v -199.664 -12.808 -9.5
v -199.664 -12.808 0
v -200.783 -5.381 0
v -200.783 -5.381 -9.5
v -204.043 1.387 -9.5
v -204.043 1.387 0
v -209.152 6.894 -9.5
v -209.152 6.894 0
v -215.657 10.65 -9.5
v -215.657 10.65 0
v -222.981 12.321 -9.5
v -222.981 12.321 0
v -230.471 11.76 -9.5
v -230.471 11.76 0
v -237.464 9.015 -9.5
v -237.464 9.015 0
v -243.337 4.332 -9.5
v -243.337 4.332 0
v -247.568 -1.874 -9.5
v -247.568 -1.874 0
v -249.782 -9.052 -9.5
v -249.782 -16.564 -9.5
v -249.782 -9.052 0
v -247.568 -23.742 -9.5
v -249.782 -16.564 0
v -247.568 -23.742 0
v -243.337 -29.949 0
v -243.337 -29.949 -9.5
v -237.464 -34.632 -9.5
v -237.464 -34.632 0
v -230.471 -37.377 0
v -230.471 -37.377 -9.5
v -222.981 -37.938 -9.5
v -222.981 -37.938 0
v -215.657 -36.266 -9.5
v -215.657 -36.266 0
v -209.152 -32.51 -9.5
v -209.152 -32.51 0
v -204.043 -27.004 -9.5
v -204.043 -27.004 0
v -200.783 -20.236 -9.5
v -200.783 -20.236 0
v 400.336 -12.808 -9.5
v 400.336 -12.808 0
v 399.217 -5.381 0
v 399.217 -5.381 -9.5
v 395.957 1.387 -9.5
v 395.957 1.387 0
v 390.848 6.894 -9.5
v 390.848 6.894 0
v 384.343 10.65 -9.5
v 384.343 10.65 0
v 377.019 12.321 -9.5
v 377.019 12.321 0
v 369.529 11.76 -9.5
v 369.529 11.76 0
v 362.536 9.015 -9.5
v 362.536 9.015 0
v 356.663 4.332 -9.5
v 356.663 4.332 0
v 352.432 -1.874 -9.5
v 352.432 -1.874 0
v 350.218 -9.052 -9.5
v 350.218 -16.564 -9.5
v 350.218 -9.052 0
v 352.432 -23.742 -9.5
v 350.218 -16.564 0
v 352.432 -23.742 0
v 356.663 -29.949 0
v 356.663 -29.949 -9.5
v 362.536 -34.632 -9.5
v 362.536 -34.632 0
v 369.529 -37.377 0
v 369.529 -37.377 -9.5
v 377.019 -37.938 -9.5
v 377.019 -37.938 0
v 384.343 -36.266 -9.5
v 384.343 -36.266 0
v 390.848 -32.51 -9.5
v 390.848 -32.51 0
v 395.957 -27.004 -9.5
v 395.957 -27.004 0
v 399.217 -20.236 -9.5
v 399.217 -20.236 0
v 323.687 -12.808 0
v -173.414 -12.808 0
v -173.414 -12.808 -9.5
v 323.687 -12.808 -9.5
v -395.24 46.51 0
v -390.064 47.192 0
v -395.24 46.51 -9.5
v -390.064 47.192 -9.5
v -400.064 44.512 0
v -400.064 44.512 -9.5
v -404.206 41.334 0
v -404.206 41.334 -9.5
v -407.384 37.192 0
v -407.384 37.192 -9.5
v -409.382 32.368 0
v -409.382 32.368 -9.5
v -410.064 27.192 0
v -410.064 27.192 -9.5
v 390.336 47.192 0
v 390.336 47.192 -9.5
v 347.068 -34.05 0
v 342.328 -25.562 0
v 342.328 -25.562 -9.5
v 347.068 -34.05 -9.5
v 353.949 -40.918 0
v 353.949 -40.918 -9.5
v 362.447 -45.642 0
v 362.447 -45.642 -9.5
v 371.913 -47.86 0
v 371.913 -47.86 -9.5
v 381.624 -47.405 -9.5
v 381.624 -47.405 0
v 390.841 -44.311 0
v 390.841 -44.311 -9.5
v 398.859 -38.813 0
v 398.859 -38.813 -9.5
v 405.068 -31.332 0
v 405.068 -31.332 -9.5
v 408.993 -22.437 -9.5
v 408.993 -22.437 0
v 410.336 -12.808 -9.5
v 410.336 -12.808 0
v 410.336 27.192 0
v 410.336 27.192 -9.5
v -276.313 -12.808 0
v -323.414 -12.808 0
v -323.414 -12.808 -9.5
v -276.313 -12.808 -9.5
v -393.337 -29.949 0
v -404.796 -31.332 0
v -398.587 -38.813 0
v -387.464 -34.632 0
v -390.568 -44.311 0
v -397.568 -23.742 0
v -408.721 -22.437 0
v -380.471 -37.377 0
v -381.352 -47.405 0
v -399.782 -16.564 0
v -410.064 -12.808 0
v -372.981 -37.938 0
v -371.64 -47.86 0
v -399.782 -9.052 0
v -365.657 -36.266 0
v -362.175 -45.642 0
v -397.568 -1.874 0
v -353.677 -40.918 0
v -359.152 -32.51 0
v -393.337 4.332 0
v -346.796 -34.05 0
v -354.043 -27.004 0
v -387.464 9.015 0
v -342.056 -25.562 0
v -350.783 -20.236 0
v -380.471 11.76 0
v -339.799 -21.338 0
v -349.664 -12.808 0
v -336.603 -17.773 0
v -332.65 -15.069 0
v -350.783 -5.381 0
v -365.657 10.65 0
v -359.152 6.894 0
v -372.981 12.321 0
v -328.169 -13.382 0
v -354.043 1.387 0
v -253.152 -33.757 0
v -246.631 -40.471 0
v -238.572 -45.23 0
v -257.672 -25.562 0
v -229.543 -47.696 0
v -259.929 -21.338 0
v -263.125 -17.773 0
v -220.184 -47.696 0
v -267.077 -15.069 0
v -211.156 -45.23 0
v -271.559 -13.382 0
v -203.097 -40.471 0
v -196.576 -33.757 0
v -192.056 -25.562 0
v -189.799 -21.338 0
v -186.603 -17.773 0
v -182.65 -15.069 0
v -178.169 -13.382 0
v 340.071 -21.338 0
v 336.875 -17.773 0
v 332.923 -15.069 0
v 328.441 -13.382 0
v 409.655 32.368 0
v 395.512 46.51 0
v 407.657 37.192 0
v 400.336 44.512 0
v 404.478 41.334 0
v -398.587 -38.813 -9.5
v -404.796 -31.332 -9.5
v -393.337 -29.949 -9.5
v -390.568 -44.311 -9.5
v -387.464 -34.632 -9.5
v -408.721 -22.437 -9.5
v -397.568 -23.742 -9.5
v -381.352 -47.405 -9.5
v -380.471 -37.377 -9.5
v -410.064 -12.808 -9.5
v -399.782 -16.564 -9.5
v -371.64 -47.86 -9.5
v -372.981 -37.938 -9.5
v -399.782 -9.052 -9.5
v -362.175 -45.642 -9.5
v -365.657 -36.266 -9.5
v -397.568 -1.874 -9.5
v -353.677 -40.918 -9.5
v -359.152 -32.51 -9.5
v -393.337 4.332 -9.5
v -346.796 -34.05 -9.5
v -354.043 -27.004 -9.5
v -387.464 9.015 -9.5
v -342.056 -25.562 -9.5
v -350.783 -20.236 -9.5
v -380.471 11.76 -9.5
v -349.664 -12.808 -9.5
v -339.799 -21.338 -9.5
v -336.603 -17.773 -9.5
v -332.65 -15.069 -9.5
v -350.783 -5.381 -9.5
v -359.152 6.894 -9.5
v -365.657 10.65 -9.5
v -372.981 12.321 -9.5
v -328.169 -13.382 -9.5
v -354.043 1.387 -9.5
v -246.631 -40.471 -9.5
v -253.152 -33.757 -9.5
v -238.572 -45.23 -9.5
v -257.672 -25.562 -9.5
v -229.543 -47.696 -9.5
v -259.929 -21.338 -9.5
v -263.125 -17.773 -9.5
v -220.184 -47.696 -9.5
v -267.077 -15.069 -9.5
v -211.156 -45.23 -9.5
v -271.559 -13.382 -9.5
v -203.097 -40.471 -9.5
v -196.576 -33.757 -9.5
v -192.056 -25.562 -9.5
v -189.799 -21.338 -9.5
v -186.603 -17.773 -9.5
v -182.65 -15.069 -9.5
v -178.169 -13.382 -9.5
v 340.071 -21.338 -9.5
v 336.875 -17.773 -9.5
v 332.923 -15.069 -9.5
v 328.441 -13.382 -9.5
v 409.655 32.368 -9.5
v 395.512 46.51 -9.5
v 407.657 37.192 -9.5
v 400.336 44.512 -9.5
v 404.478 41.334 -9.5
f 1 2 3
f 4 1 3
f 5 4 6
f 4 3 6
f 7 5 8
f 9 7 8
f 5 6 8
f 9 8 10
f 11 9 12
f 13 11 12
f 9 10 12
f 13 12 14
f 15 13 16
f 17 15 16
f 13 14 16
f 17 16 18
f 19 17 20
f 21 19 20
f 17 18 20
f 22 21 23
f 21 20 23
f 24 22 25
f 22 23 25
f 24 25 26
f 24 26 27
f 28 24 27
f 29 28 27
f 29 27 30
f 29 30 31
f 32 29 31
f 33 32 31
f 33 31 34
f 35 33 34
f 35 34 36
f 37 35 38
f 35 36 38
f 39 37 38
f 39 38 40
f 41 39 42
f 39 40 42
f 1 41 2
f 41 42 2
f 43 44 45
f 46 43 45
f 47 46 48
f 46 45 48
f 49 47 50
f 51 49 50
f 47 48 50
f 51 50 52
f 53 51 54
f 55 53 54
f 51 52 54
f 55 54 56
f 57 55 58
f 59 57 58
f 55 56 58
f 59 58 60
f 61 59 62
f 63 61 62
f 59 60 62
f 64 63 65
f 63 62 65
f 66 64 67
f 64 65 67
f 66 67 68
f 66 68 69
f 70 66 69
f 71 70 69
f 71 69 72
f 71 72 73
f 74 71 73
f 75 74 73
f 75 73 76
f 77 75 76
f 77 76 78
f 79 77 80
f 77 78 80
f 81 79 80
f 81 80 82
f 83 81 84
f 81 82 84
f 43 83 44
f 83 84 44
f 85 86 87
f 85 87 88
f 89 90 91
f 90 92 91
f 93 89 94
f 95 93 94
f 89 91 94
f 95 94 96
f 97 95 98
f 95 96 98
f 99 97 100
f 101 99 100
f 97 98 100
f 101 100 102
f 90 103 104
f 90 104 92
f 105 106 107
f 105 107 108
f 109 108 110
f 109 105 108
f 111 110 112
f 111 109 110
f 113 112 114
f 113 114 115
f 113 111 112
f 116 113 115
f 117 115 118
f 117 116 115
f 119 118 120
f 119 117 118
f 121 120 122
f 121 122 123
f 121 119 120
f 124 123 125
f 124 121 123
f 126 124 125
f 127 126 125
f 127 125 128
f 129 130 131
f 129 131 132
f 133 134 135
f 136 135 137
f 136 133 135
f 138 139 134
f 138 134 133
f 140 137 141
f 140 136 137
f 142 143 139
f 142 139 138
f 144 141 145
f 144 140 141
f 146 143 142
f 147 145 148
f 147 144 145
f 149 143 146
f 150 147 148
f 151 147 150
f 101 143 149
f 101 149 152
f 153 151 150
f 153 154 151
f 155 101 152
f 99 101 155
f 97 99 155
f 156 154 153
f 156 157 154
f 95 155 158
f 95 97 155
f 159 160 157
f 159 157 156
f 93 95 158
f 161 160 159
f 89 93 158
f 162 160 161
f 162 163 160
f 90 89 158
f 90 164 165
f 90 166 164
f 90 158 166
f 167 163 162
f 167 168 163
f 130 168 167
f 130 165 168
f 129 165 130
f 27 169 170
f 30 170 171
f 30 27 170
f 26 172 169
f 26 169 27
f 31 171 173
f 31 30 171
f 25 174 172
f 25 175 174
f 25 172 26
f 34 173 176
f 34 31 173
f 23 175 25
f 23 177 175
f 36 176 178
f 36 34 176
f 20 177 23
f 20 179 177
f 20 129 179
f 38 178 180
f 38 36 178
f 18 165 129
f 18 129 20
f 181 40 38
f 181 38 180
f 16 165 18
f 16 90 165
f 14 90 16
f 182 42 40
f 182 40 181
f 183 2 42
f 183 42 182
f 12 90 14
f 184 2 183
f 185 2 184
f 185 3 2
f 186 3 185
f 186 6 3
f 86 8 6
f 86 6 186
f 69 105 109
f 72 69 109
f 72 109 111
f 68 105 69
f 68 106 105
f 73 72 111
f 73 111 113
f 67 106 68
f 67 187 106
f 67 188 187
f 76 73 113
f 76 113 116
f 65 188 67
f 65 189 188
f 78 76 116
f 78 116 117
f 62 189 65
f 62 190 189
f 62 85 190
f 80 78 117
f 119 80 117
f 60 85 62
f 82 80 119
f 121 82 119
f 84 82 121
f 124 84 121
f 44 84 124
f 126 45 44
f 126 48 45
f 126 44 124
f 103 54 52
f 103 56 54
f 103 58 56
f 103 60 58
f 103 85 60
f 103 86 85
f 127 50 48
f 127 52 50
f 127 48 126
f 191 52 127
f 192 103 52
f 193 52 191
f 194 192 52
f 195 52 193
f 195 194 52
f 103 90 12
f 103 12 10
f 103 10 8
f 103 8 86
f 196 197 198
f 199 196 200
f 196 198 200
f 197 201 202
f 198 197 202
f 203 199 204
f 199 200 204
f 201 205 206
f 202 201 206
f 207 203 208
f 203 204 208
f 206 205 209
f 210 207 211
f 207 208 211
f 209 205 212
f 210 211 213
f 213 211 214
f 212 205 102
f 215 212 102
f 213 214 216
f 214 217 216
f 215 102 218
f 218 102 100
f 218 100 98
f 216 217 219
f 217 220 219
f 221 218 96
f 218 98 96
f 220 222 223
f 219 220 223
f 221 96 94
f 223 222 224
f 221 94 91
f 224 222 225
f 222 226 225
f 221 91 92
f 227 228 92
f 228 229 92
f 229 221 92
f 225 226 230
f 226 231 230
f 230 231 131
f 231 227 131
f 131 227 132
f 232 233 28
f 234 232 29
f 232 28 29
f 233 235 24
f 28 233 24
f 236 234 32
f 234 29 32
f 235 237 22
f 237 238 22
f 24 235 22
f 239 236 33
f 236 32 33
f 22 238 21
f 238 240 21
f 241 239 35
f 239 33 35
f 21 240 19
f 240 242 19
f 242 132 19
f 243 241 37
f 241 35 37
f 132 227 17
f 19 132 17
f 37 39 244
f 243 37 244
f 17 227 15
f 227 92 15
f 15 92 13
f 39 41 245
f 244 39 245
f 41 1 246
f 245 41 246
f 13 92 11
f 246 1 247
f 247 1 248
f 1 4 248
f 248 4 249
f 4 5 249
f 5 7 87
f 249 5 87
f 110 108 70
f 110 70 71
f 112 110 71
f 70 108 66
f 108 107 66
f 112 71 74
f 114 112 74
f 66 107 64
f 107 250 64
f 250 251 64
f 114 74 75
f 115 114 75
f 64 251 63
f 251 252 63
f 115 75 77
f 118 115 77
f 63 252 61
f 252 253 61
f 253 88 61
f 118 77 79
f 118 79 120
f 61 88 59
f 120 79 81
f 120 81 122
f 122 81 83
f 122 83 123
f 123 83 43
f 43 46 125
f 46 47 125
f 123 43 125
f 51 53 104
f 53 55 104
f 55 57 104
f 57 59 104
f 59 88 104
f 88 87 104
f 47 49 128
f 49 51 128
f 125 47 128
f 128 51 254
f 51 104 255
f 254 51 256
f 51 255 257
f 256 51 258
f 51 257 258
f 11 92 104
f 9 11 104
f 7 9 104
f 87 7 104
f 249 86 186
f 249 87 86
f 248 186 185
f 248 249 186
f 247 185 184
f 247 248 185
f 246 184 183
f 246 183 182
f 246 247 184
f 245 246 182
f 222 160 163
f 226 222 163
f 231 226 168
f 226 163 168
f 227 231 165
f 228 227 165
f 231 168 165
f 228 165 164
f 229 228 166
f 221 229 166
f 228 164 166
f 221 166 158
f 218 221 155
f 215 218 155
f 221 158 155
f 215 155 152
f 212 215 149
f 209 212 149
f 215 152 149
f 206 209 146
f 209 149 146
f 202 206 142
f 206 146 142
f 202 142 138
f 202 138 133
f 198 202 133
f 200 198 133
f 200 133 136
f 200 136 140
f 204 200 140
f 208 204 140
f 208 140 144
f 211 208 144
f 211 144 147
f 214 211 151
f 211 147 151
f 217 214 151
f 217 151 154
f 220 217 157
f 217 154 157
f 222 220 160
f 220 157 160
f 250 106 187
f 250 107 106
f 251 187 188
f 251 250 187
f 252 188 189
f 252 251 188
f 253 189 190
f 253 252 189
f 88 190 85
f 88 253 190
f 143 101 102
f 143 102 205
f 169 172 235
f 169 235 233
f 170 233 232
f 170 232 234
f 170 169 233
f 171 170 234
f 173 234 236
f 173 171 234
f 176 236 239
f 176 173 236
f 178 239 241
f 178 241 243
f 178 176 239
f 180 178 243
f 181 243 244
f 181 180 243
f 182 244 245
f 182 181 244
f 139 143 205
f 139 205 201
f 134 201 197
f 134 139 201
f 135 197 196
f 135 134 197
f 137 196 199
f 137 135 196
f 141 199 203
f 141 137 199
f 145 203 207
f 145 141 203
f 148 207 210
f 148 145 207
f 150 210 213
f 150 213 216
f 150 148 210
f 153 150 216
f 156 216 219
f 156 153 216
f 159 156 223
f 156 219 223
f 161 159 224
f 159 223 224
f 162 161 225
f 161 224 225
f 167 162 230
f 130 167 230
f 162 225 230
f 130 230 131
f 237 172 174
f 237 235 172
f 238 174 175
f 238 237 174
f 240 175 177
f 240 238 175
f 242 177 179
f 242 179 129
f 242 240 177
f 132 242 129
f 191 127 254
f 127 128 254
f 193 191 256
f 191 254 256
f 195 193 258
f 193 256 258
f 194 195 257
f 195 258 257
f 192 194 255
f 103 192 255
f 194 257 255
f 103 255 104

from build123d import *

# Parameters (mm, degrees)
ESBO_O2_R          = 25.2
FLANGE_BASE1_DEPTH = 9.5
FILETE1_R          = 20


# Sheet-metal steps are written as plain solids
with BuildPart() as part:
    # Esboço2 → Flange-base1 (new body)
    with BuildSketch(Plane.XY):
        with BuildLine():
            Line((410.336115278, -12.808345835), (410.336115278, 47.191654165))
            Line((410.336115278, 47.191654165), (-410.063884722, 47.191654165))
            Line((-410.063884722, 47.191654165), (-410.063884722, -12.808345835))
            ThreePointArc((-410.063884722, -12.808345835), (-374.863884722, -48.008345835), (-339.663884722, -12.808345835))
            Line((-339.663884722, -12.808345835), (-260.063884722, -12.808345835))
            ThreePointArc((-260.063884722, -12.808345835), (-224.863884722, -48.008345835), (-189.663884722, -12.808345835))
            Line((-189.663884722, -12.808345835), (339.936115278, -12.808345835))
            ThreePointArc((339.936115278, -12.808345835), (375.136115278, -48.008345835), (410.336115278, -12.808345835))
        make_face()
        with Locations((375.136115278, -12.808345835)):
            Circle(ESBO_O2_R, mode=Mode.SUBTRACT)
        with Locations((-224.863884722, -12.808345835)):
            Circle(ESBO_O2_R, mode=Mode.SUBTRACT)
        with Locations((-374.863884722, -12.808345835)):
            Circle(ESBO_O2_R, mode=Mode.SUBTRACT)
    extrude(amount=-FLANGE_BASE1_DEPTH)

    # Filete1
    filete1_edges = [part.edges().sort_by_distance(p)[0] for p in [
        (339.936115278, -12.808345835, -4.75),
        (-189.663884722, -12.808345835, -4.75),
        (-260.063884722, -12.808345835, -4.75),
        (-339.663884722, -12.808345835, -4.75),
        (-410.063884722, 47.191654165, -4.75),
        (410.336115278, 47.191654165, -4.75),
    ]]
    fillet(filete1_edges, radius=FILETE1_R)


solid = part.part
